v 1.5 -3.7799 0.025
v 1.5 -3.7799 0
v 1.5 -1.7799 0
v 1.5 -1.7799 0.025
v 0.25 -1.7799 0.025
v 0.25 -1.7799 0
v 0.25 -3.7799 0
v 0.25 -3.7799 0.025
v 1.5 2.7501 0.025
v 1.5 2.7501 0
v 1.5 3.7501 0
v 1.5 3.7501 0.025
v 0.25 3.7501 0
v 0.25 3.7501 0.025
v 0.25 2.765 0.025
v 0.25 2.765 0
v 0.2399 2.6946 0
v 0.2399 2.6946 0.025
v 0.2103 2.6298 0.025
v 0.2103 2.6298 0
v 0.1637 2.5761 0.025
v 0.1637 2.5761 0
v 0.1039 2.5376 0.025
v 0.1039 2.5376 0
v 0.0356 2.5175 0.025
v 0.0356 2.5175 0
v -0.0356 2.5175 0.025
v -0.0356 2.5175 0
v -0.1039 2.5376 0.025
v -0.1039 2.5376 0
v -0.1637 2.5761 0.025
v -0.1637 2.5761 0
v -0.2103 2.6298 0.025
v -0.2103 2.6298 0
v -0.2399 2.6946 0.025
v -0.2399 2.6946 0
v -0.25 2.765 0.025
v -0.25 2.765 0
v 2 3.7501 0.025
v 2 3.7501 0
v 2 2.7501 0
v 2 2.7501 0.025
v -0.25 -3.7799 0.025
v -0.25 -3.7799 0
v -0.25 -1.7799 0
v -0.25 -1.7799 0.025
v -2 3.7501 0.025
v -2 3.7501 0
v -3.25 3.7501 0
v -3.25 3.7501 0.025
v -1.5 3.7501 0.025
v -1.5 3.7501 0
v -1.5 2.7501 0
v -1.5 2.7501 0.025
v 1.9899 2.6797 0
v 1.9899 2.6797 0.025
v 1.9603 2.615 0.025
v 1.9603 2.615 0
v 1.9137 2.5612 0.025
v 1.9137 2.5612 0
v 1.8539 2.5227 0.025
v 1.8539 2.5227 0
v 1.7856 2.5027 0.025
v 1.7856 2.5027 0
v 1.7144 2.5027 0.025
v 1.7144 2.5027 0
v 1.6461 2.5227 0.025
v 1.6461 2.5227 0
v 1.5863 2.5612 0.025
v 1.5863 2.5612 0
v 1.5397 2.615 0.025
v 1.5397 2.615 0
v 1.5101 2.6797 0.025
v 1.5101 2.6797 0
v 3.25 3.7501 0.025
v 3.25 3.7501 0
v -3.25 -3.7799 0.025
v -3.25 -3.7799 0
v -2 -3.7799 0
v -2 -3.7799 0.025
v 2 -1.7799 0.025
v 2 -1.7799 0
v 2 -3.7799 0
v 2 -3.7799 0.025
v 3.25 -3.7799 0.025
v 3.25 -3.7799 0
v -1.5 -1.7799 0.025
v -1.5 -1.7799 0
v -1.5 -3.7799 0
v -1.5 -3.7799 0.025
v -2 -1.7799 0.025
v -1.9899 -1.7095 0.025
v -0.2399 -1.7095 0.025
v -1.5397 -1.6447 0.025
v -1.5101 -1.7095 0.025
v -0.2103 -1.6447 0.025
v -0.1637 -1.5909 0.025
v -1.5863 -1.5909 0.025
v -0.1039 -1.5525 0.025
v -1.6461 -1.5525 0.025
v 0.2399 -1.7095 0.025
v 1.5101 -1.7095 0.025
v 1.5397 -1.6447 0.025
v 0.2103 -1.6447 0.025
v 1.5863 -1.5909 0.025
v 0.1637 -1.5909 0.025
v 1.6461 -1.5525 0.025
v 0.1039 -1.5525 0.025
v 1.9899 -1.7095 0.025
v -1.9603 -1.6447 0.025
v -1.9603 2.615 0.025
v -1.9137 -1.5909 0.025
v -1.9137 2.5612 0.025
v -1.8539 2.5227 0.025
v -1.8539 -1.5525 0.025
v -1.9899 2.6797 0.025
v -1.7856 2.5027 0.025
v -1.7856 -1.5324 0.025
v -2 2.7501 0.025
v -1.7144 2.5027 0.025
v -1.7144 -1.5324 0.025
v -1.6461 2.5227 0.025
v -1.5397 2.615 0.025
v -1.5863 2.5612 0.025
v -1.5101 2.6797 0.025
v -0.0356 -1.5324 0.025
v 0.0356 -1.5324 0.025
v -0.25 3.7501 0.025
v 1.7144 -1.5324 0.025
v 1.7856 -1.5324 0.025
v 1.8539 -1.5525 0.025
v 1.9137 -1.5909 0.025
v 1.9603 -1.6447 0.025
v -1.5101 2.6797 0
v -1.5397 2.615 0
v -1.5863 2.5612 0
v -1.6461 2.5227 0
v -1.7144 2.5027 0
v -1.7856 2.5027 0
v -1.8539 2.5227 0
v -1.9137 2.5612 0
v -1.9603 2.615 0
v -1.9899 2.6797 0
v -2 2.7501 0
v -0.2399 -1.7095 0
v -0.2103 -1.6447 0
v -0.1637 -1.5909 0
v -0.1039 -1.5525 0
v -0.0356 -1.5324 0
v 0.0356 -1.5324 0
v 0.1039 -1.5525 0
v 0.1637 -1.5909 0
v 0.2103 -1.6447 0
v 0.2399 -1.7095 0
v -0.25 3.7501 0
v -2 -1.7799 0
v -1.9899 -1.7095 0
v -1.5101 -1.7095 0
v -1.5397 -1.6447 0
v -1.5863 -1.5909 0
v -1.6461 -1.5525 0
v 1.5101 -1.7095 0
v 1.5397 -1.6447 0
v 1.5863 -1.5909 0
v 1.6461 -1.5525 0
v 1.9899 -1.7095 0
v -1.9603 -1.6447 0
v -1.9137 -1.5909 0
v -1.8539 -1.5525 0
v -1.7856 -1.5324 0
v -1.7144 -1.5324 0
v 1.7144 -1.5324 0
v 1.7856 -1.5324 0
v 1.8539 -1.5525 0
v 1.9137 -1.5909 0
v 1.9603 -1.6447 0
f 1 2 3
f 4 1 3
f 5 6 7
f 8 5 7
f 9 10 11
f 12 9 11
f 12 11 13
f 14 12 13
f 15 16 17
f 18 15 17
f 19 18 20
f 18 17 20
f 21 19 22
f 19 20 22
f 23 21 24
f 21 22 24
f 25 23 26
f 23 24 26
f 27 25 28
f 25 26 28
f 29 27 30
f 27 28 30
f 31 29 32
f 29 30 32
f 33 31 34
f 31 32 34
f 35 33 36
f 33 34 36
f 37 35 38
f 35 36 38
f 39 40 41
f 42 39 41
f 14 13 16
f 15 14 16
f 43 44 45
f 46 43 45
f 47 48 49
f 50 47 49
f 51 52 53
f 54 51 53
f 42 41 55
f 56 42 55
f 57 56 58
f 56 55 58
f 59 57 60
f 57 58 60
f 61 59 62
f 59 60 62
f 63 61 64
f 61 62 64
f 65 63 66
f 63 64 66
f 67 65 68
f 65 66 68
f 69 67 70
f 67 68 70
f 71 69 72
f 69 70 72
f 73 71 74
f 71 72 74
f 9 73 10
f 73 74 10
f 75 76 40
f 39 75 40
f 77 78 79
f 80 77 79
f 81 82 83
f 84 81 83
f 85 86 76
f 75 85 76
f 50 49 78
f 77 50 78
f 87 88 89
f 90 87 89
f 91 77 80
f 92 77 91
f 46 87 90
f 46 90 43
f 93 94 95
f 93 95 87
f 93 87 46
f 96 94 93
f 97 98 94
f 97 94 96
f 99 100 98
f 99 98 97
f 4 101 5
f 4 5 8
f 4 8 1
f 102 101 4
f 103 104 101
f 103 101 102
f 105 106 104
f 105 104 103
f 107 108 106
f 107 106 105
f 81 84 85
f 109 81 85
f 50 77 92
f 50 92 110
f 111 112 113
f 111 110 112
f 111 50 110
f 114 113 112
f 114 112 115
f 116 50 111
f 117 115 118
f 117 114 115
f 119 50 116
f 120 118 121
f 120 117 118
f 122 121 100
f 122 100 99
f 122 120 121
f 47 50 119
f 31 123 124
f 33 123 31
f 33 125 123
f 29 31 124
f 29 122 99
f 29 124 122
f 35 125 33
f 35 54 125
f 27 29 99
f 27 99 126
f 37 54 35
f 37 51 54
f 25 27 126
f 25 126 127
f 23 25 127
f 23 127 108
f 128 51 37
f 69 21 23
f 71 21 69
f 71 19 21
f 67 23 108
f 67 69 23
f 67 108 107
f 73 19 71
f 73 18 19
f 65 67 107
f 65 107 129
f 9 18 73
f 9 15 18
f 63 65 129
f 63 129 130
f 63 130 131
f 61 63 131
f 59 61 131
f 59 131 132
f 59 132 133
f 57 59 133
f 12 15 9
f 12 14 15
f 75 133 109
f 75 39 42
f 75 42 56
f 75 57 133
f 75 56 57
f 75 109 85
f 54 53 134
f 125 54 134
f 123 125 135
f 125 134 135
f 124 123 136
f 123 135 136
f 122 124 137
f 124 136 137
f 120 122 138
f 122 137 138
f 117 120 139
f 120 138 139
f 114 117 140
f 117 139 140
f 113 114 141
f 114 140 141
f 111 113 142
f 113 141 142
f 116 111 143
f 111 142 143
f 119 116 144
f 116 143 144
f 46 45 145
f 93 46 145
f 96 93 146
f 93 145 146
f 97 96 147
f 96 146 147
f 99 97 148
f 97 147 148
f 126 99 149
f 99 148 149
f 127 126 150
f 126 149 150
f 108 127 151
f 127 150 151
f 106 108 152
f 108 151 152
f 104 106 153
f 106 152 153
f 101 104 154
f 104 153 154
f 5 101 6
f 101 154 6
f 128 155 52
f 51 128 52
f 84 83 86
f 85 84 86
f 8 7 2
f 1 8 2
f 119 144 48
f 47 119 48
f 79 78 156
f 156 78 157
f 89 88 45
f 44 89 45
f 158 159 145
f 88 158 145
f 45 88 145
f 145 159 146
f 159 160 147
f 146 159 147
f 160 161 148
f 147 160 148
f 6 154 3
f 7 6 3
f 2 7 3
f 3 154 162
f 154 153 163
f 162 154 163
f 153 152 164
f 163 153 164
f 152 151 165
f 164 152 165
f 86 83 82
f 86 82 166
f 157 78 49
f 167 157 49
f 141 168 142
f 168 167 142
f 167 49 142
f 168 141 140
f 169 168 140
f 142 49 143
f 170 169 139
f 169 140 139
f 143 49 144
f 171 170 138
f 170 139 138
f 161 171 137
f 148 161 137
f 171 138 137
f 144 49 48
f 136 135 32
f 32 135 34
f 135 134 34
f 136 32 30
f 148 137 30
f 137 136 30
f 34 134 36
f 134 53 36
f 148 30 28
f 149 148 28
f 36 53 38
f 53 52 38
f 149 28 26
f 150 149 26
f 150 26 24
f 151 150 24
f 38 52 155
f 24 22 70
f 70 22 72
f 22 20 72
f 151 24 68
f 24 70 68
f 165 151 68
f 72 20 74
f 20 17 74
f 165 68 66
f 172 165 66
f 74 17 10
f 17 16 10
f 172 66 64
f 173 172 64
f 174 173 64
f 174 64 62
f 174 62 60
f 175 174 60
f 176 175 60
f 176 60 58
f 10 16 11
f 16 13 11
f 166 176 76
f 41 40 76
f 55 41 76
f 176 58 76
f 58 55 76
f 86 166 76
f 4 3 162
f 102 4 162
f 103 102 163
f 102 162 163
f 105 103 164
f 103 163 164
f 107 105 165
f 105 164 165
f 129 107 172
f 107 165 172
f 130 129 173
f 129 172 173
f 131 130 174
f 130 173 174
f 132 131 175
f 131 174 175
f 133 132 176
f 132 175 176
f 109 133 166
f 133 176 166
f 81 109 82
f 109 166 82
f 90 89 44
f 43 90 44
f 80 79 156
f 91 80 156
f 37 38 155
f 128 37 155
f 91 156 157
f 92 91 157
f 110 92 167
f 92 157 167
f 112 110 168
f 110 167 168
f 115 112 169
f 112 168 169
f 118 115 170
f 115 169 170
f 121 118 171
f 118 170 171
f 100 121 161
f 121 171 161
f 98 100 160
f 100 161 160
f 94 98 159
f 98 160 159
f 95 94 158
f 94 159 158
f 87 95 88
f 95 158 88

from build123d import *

# Parameters (mm, degrees)
BOSS_EXTRUDE1_DEPTH = 0.025


with BuildPart() as part:
    # Sketch3 → Boss-Extrude1 (new body)
    with BuildSketch(Plane.XY):
        with BuildLine():
            Line((-2, 3.75011651), (-3.25, 3.75011651))
            Line((-3.25, 3.75011651), (-3.25, -3.77988349))
            Line((-3.25, -3.77988349), (-2, -3.77988349))
            Line((-2, -3.77988349), (-2, -1.77988349))
            ThreePointArc((-2, -1.77988349), (-1.75, -1.52988349), (-1.5, -1.77988349))
            Line((-1.5, -1.77988349), (-1.5, -3.77988349))
            Line((-1.5, -3.77988349), (-0.25, -3.77988349))
            Line((-0.25, -3.77988349), (-0.25, -1.77988349))
            ThreePointArc((-0.25, -1.77988349), (0, -1.52988349), (0.25, -1.77988349))
            Line((0.25, -1.77988349), (0.25, -3.77988349))
            Line((0.25, -3.77988349), (1.5, -3.77988349))
            Line((1.5, -3.77988349), (1.5, -1.77988349))
            ThreePointArc((1.5, -1.77988349), (1.75, -1.52988349), (2, -1.77988349))
            Line((2, -1.77988349), (2, -3.77988349))
            Line((2, -3.77988349), (3.25, -3.77988349))
            Line((3.25, -3.77988349), (3.25, 3.75011651))
            Line((3.25, 3.75011651), (2, 3.75011651))
            Line((2, 3.75011651), (2, 2.75011651))
            ThreePointArc((2, 2.75011651), (1.75, 2.50011651), (1.5, 2.75011651))
            Line((1.5, 2.75011651), (1.5, 3.75011651))
            Line((1.5, 3.75011651), (0.25, 3.75011651))
            Line((0.25, 3.75011651), (0.25, 2.765))
            ThreePointArc((0.25, 2.765), (0, 2.515), (-0.25, 2.765))
            Line((-0.25, 2.765), (-0.25, 3.75011651))
            Line((-0.25, 3.75011651), (-1.5, 3.75011651))
            Line((-1.5, 3.75011651), (-1.5, 2.75011651))
            ThreePointArc((-1.5, 2.75011651), (-1.75, 2.50011651), (-2, 2.75011651))
            Line((-2, 2.75011651), (-2, 3.75011651))
        make_face()
    extrude(amount=BOSS_EXTRUDE1_DEPTH)


solid = part.part
